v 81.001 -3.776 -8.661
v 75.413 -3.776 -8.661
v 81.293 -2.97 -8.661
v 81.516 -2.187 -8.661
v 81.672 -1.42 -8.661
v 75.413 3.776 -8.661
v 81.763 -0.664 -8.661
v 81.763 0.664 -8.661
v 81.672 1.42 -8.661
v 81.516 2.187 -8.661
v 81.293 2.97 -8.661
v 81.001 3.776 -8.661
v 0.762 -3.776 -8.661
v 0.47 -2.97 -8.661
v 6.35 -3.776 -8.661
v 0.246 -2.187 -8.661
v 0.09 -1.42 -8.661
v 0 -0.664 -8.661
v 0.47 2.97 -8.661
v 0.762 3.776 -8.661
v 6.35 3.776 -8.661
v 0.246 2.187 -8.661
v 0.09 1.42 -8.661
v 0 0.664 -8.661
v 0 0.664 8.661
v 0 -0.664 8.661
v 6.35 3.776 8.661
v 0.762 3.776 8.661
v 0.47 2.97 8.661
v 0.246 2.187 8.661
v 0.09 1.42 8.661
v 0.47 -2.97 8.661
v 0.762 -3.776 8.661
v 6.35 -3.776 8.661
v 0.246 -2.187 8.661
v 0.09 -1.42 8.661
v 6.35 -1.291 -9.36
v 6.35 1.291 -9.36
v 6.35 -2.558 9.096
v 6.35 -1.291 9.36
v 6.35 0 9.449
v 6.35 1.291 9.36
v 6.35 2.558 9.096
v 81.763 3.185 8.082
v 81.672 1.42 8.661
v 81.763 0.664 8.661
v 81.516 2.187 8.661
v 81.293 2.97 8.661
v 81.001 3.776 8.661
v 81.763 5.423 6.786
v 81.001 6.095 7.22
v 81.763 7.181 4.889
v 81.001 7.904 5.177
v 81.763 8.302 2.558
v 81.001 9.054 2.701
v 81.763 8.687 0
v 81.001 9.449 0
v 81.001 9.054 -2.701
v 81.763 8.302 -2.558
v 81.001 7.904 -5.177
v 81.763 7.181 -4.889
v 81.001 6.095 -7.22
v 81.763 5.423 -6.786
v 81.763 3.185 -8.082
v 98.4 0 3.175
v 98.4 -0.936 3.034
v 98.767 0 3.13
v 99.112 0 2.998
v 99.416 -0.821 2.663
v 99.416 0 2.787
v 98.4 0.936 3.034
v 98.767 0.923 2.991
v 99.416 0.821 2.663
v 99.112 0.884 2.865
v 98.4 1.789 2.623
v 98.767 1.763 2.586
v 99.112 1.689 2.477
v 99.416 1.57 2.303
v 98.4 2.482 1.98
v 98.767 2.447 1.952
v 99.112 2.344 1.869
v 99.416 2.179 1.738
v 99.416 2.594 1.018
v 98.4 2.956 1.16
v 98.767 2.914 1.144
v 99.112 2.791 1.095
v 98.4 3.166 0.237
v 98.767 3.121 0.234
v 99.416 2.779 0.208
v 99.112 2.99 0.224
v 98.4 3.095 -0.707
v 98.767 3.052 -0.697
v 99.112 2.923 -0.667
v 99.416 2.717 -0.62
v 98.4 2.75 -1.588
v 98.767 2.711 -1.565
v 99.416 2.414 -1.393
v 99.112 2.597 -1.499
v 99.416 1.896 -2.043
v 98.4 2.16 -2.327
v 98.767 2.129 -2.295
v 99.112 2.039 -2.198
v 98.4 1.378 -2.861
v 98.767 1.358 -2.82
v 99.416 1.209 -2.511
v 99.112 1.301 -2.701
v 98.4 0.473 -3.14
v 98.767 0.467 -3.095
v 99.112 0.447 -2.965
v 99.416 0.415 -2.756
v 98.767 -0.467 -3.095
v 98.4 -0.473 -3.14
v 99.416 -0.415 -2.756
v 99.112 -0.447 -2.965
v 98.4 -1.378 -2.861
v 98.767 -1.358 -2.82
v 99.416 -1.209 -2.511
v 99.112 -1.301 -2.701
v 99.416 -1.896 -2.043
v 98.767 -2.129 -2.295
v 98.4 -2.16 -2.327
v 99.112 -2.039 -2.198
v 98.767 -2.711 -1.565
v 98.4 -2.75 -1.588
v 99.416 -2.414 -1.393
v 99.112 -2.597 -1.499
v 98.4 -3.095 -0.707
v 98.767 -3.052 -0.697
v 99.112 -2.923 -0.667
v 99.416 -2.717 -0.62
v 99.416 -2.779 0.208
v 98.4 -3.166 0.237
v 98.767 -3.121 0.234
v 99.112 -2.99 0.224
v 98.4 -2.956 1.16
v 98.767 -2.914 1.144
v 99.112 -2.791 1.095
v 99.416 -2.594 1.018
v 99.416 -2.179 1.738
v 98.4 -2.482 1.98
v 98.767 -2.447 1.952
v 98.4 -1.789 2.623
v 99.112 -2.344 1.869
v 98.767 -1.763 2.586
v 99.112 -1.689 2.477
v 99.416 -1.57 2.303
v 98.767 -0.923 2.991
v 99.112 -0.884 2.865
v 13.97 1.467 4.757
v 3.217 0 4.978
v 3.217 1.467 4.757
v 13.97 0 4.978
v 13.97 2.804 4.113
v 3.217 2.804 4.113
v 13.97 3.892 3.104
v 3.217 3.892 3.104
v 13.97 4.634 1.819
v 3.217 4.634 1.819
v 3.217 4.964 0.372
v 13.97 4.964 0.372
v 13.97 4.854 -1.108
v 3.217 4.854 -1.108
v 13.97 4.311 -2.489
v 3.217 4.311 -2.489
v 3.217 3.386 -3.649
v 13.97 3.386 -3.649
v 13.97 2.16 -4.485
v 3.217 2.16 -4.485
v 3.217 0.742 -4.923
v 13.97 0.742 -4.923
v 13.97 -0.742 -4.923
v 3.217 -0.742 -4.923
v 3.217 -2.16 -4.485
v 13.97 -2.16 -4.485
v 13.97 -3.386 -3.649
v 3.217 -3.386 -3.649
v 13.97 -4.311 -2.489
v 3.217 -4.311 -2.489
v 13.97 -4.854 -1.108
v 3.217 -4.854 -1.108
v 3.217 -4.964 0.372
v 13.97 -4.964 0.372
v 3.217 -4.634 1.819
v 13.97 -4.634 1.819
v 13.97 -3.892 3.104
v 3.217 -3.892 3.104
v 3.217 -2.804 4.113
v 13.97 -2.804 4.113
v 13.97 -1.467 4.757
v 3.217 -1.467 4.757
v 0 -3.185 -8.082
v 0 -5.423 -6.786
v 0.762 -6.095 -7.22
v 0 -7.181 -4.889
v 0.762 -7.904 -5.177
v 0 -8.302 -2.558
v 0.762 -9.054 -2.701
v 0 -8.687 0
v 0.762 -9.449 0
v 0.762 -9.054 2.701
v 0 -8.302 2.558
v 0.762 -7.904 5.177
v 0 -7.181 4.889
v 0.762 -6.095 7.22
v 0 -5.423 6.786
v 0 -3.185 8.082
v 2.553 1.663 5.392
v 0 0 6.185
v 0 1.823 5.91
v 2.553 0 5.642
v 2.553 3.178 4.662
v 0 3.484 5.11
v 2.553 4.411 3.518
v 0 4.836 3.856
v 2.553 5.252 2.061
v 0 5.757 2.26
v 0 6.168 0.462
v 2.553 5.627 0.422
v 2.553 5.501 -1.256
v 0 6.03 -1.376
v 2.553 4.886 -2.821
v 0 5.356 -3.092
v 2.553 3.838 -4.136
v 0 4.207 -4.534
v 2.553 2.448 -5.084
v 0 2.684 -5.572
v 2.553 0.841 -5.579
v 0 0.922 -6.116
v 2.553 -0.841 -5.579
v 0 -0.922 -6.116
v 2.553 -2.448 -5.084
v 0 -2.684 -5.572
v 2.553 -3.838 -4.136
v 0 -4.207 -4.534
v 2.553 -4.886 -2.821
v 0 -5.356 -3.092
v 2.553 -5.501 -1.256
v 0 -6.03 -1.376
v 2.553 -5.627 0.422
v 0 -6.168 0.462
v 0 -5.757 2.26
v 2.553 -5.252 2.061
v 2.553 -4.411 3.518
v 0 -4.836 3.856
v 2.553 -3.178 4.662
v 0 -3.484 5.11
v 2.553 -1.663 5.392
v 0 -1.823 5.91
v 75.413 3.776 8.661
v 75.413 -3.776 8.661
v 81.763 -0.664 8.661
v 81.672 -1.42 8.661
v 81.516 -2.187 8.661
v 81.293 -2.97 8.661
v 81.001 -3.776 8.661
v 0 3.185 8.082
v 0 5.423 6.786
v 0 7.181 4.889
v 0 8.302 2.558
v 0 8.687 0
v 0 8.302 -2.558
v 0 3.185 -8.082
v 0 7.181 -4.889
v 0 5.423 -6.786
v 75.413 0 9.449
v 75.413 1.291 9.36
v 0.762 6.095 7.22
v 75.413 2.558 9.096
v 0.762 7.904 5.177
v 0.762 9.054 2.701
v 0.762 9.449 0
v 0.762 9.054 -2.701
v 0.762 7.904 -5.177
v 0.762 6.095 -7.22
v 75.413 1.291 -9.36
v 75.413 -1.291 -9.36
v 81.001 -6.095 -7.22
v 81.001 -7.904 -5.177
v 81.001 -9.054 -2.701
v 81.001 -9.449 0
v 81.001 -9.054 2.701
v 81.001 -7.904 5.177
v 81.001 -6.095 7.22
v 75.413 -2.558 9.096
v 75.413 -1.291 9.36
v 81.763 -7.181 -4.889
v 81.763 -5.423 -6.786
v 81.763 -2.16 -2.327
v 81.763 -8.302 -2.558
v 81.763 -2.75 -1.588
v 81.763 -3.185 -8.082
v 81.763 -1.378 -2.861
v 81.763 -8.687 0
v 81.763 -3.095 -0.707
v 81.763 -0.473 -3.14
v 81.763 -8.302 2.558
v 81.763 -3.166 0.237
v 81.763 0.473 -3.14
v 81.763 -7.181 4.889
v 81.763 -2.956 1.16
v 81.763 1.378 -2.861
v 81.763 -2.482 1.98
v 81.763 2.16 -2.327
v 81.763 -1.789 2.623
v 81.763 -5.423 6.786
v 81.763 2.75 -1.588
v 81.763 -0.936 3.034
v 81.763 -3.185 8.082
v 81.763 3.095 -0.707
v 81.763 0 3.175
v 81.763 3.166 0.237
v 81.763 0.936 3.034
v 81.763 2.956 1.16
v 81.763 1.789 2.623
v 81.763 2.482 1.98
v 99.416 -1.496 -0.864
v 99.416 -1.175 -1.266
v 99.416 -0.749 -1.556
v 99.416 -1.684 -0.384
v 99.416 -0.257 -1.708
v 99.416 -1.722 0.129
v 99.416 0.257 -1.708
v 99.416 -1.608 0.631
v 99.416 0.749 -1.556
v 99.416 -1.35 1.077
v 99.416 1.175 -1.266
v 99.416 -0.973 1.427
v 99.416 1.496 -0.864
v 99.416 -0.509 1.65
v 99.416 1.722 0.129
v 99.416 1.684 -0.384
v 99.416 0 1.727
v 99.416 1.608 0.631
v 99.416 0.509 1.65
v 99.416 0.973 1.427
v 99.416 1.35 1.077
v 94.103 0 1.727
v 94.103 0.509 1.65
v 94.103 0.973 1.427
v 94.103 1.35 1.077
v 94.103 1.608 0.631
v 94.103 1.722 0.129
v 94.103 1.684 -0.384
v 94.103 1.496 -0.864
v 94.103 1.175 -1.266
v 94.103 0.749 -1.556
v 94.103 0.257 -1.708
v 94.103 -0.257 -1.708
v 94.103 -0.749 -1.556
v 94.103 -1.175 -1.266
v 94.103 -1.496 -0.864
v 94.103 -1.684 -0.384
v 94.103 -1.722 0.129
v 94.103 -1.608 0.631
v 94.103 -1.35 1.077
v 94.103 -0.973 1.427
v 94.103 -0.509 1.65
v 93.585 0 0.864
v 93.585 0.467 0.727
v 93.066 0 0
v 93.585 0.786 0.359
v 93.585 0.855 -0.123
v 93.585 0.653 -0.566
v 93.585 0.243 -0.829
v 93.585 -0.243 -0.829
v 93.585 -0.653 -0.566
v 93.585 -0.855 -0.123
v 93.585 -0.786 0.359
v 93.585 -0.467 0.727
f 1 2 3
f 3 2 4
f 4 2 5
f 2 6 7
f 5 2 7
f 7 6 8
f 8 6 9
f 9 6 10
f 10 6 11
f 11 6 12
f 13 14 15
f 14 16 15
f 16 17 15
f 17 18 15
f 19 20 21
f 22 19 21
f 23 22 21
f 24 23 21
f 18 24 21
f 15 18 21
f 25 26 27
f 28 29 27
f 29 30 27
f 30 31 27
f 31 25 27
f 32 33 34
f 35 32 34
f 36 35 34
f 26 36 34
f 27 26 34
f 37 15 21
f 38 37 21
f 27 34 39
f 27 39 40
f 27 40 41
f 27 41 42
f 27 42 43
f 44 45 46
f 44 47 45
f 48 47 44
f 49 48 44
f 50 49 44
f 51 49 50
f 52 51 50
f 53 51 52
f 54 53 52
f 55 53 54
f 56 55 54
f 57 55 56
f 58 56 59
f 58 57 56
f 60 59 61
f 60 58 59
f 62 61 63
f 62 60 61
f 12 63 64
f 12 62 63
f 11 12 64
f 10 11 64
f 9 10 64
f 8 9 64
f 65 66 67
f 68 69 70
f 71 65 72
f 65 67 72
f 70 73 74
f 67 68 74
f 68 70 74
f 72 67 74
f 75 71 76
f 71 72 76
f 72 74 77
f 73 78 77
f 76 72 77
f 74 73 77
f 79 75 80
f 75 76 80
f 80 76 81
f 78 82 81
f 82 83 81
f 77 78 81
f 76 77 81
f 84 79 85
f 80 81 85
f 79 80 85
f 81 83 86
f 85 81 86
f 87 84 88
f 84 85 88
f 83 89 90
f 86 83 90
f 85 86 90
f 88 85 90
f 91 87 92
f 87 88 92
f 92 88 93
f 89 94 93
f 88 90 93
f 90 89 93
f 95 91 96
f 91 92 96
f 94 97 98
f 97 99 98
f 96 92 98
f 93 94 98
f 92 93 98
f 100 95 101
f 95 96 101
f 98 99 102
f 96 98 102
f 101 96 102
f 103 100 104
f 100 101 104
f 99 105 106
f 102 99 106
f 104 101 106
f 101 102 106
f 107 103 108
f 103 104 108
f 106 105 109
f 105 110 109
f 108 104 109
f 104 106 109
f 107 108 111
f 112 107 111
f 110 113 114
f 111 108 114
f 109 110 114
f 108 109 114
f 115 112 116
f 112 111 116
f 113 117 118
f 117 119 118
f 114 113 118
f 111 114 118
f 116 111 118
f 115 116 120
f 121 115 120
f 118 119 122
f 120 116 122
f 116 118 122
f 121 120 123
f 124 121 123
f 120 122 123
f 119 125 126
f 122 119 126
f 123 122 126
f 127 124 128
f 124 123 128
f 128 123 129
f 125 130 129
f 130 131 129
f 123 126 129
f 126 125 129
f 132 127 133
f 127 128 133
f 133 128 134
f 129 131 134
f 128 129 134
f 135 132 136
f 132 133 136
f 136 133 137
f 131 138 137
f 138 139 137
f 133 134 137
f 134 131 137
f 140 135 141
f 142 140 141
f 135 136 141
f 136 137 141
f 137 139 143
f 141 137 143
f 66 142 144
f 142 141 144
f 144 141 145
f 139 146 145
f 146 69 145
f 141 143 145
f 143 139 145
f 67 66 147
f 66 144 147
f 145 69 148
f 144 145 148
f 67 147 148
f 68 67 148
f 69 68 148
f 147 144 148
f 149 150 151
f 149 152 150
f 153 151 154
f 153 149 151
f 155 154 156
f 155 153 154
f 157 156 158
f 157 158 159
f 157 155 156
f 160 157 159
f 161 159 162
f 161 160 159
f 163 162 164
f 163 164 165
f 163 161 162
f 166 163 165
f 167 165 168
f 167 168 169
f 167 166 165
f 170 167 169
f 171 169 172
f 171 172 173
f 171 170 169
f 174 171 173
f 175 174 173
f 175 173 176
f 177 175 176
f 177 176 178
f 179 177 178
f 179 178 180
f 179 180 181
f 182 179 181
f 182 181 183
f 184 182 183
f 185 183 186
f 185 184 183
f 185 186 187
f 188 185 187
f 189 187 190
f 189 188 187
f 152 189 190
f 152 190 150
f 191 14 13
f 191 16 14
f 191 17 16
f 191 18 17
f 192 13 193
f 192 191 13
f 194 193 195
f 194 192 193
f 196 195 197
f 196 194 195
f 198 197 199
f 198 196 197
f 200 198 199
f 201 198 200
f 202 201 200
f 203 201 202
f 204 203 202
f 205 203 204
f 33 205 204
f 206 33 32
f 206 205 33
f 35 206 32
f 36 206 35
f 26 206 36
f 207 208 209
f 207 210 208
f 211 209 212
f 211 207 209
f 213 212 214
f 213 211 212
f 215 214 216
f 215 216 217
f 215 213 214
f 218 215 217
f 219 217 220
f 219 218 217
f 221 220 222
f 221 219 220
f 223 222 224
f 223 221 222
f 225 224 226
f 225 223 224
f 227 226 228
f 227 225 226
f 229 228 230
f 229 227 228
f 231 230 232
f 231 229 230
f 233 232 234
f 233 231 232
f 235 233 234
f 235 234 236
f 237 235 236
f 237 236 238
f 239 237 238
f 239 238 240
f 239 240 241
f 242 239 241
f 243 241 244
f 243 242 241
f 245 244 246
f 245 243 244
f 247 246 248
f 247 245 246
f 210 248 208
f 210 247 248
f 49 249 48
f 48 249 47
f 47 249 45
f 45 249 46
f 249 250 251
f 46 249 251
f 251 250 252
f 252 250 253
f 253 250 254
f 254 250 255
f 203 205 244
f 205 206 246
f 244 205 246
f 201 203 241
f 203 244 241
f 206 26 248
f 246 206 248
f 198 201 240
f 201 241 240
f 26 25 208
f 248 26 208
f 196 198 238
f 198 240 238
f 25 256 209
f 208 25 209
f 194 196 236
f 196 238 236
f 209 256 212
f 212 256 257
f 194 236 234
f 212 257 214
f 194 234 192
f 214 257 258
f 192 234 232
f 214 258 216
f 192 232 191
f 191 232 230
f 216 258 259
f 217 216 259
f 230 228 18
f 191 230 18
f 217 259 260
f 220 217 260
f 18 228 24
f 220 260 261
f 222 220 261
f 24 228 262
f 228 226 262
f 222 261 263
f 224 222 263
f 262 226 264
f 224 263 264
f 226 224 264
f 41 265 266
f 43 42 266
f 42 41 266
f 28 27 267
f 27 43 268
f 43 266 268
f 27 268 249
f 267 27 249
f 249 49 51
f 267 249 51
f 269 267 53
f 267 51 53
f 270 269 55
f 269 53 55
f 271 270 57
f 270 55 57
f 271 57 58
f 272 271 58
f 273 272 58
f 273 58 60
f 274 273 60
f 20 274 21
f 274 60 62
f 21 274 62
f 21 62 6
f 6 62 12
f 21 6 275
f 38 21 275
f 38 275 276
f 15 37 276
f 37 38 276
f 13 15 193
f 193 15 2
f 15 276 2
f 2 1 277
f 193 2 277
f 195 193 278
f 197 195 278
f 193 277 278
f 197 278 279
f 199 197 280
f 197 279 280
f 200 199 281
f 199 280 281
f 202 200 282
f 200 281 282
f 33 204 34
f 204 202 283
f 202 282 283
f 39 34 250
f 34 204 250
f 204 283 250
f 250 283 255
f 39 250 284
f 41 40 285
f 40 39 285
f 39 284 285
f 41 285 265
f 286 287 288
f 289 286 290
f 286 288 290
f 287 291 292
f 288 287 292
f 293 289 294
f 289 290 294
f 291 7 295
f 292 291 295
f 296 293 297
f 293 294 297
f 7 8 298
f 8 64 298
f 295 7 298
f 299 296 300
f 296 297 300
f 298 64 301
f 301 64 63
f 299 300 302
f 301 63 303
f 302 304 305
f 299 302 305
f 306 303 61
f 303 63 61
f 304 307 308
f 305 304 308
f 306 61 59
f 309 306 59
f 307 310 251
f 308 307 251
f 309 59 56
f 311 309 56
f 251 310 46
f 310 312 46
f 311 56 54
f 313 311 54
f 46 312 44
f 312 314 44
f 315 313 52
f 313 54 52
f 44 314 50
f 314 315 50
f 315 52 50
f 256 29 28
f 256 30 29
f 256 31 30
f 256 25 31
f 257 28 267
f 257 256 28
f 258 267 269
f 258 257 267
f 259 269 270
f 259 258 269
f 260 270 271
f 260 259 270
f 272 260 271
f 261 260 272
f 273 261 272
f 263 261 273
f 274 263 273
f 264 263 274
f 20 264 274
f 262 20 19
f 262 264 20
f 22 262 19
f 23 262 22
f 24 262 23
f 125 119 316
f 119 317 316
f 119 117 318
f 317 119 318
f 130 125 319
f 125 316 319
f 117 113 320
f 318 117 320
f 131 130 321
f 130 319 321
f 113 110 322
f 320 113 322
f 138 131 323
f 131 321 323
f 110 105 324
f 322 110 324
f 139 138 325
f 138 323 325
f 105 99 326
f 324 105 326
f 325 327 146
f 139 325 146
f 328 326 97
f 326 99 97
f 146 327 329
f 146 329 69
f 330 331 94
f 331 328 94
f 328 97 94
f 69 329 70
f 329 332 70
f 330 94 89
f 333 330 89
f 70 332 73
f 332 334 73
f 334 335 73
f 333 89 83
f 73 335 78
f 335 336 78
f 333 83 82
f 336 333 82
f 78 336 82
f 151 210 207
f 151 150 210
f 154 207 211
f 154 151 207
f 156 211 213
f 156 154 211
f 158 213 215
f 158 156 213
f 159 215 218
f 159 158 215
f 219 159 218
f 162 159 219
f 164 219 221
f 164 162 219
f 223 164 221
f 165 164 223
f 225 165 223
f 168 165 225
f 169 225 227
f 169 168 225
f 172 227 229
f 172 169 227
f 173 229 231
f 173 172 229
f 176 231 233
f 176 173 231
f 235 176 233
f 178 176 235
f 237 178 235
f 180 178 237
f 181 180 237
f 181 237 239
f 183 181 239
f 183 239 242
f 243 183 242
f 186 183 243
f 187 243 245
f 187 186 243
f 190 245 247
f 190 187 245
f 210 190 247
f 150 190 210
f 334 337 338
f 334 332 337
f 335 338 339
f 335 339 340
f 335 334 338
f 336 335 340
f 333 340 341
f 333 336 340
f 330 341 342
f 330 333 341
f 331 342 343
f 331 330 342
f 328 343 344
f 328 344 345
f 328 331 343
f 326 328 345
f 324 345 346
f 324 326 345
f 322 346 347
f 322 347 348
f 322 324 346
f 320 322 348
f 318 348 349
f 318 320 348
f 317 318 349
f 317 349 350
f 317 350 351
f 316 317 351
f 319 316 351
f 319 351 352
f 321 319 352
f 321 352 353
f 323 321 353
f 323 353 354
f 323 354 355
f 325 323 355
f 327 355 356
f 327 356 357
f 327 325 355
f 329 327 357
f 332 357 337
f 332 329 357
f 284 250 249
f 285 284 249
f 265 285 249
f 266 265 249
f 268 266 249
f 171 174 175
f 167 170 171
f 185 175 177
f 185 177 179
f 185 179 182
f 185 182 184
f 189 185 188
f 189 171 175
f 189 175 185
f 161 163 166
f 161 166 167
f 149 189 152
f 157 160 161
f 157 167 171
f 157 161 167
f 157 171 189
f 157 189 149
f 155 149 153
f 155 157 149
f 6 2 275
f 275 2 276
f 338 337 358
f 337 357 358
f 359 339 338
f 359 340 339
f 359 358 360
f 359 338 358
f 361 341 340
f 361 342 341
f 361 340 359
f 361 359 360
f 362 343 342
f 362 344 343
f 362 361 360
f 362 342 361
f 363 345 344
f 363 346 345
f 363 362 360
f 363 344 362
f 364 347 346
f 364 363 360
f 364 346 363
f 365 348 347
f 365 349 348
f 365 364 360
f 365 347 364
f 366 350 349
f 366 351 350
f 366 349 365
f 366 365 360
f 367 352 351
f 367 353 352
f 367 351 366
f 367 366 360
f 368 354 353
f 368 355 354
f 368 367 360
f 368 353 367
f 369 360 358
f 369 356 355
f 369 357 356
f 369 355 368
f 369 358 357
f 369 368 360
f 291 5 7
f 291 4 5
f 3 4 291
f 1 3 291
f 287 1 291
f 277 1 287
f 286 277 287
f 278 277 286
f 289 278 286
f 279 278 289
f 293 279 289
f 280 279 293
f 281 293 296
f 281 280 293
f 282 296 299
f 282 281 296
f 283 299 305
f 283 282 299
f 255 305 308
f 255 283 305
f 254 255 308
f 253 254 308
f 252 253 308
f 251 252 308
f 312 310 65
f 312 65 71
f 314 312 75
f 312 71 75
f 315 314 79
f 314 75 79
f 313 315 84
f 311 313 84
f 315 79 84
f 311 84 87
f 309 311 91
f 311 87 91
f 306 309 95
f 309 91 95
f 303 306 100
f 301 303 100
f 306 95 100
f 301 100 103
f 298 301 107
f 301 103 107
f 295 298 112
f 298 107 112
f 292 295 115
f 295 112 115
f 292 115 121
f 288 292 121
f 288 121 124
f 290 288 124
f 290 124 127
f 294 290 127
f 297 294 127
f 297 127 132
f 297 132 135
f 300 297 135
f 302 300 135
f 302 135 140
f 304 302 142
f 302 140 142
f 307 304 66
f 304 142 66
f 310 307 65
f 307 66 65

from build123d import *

# Parameters (mm, degrees)
CHAMFER1_SIZE           = 0.762
SKETCH5_W               = 6.35
SKETCH5_H               = 0.7874
CUT_EXTRUDE1_DEPTH      = 10.4488
CUT_EXTRUDE1_DEPTH_BACK = 10.4488
SKETCH6_W               = 6.35
SKETCH6_H               = 0.7874
CUT_EXTRUDE2_DEPTH      = 10.4488
CUT_EXTRUDE2_DEPTH_BACK = 10.4488


with BuildPart() as part:
    # Sketch1 → Revolve1 (revolve)
    with BuildSketch(Plane(origin=(0, 0, 0), x_dir=(-1, 0, 0), z_dir=(0, 0, -1)), mode=Mode.PRIVATE) as revolve1_sk:
        with BuildLine():
            Line((-99.4156, 2.786922533), (-99.4156, 0))
            Line((-99.4156, 0), (0, 0))
            Line((0, 0), (0, 9.4488))
            Line((0, 9.4488), (-81.7626, 9.4488))
            Line((-81.7626, 9.4488), (-81.7626, 3.175))
            Line((-81.7626, 3.175), (-98.3996, 3.175))
            ThreePointArc((-98.3996, 3.175), (-98.943396865, 3.074678675), (-99.4156, 2.786922533))
        make_face()
    revolve(revolve1_sk.sketch.rotate(Axis((99.4156, 0, 0), (-1, 0, 0)), 270), axis=Axis((99.4156, 0, 0), (-1, 0, 0)))  # turned: the seam where the file's is

    # Sketch2 → Cut-Revolve1 (revolve, cut)
    with BuildSketch(Plane(origin=(0, 0, 0), x_dir=(-1, 0, 0), z_dir=(0, 0, -1)), mode=Mode.PRIVATE) as cut_revolve1_sk:
        Polygon((-13.97, 4.9784), (-13.97, 0), (0, 0), (0, 6.1849), (-2.5527, 5.642306865), (-3.216606865, 4.9784), align=None)
    revolve(cut_revolve1_sk.sketch.rotate(Axis((13.97, 0, 0), (-1, 0, 0)), 270), axis=Axis((13.97, 0, 0), (-1, 0, 0)), mode=Mode.SUBTRACT)  # turned: the seam where the file's is

    # Sketch3 → Cut-Revolve2 (revolve, cut)
    with BuildSketch(Plane(origin=(0, 0, 0), x_dir=(-1, 0, 0), z_dir=(0, 0, -1)), mode=Mode.PRIVATE) as cut_revolve2_sk:
        Polygon((-99.4156, 1.7272), (-99.4156, 0), (-93.0656, 0), (-94.103406461, 1.7272), align=None)
    revolve(cut_revolve2_sk.sketch.rotate(Axis((66.313858967, 0, 0), (-1, 0, 0)), 270), axis=Axis((66.313858967, 0, 0), (-1, 0, 0)), mode=Mode.SUBTRACT)  # turned: the seam where the file's is

    # Chamfer1
    chamfer1_edges = [part.edges().sort_by_distance(p)[0] for p in [
        (81.7626, 0, -9.4488),
        (0, 0, -9.4488),
    ]]
    chamfer(chamfer1_edges, length=CHAMFER1_SIZE)

    # Sketch5 → Cut-Extrude1 (cut, two sides)
    with BuildSketch(Plane(origin=(0, 0, 0), x_dir=(1, 0, 0), z_dir=(0, 1, 0))) as cut_extrude1_sk:
        with Locations((3.175, 9.0551)):
            Rectangle(SKETCH5_W, SKETCH5_H)
        with Locations((3.175, -9.0551)):
            Rectangle(SKETCH5_W, SKETCH5_H)
    extrude(amount=CUT_EXTRUDE1_DEPTH, mode=Mode.SUBTRACT)
    extrude(cut_extrude1_sk.sketch, amount=-CUT_EXTRUDE1_DEPTH_BACK, mode=Mode.SUBTRACT)

    # Sketch6 → Cut-Extrude2 (cut, two sides)
    with BuildSketch(Plane(origin=(0, 0, 0), x_dir=(1, 0, 0), z_dir=(0, 1, 0))) as cut_extrude2_sk:
        with Locations((78.5876, 9.0551)):
            Rectangle(SKETCH6_W, SKETCH6_H)
        with Locations((78.5876, -9.0551)):
            Rectangle(SKETCH6_W, SKETCH6_H)
    extrude(amount=CUT_EXTRUDE2_DEPTH, mode=Mode.SUBTRACT)
    extrude(cut_extrude2_sk.sketch, amount=-CUT_EXTRUDE2_DEPTH_BACK, mode=Mode.SUBTRACT)


solid = part.part
